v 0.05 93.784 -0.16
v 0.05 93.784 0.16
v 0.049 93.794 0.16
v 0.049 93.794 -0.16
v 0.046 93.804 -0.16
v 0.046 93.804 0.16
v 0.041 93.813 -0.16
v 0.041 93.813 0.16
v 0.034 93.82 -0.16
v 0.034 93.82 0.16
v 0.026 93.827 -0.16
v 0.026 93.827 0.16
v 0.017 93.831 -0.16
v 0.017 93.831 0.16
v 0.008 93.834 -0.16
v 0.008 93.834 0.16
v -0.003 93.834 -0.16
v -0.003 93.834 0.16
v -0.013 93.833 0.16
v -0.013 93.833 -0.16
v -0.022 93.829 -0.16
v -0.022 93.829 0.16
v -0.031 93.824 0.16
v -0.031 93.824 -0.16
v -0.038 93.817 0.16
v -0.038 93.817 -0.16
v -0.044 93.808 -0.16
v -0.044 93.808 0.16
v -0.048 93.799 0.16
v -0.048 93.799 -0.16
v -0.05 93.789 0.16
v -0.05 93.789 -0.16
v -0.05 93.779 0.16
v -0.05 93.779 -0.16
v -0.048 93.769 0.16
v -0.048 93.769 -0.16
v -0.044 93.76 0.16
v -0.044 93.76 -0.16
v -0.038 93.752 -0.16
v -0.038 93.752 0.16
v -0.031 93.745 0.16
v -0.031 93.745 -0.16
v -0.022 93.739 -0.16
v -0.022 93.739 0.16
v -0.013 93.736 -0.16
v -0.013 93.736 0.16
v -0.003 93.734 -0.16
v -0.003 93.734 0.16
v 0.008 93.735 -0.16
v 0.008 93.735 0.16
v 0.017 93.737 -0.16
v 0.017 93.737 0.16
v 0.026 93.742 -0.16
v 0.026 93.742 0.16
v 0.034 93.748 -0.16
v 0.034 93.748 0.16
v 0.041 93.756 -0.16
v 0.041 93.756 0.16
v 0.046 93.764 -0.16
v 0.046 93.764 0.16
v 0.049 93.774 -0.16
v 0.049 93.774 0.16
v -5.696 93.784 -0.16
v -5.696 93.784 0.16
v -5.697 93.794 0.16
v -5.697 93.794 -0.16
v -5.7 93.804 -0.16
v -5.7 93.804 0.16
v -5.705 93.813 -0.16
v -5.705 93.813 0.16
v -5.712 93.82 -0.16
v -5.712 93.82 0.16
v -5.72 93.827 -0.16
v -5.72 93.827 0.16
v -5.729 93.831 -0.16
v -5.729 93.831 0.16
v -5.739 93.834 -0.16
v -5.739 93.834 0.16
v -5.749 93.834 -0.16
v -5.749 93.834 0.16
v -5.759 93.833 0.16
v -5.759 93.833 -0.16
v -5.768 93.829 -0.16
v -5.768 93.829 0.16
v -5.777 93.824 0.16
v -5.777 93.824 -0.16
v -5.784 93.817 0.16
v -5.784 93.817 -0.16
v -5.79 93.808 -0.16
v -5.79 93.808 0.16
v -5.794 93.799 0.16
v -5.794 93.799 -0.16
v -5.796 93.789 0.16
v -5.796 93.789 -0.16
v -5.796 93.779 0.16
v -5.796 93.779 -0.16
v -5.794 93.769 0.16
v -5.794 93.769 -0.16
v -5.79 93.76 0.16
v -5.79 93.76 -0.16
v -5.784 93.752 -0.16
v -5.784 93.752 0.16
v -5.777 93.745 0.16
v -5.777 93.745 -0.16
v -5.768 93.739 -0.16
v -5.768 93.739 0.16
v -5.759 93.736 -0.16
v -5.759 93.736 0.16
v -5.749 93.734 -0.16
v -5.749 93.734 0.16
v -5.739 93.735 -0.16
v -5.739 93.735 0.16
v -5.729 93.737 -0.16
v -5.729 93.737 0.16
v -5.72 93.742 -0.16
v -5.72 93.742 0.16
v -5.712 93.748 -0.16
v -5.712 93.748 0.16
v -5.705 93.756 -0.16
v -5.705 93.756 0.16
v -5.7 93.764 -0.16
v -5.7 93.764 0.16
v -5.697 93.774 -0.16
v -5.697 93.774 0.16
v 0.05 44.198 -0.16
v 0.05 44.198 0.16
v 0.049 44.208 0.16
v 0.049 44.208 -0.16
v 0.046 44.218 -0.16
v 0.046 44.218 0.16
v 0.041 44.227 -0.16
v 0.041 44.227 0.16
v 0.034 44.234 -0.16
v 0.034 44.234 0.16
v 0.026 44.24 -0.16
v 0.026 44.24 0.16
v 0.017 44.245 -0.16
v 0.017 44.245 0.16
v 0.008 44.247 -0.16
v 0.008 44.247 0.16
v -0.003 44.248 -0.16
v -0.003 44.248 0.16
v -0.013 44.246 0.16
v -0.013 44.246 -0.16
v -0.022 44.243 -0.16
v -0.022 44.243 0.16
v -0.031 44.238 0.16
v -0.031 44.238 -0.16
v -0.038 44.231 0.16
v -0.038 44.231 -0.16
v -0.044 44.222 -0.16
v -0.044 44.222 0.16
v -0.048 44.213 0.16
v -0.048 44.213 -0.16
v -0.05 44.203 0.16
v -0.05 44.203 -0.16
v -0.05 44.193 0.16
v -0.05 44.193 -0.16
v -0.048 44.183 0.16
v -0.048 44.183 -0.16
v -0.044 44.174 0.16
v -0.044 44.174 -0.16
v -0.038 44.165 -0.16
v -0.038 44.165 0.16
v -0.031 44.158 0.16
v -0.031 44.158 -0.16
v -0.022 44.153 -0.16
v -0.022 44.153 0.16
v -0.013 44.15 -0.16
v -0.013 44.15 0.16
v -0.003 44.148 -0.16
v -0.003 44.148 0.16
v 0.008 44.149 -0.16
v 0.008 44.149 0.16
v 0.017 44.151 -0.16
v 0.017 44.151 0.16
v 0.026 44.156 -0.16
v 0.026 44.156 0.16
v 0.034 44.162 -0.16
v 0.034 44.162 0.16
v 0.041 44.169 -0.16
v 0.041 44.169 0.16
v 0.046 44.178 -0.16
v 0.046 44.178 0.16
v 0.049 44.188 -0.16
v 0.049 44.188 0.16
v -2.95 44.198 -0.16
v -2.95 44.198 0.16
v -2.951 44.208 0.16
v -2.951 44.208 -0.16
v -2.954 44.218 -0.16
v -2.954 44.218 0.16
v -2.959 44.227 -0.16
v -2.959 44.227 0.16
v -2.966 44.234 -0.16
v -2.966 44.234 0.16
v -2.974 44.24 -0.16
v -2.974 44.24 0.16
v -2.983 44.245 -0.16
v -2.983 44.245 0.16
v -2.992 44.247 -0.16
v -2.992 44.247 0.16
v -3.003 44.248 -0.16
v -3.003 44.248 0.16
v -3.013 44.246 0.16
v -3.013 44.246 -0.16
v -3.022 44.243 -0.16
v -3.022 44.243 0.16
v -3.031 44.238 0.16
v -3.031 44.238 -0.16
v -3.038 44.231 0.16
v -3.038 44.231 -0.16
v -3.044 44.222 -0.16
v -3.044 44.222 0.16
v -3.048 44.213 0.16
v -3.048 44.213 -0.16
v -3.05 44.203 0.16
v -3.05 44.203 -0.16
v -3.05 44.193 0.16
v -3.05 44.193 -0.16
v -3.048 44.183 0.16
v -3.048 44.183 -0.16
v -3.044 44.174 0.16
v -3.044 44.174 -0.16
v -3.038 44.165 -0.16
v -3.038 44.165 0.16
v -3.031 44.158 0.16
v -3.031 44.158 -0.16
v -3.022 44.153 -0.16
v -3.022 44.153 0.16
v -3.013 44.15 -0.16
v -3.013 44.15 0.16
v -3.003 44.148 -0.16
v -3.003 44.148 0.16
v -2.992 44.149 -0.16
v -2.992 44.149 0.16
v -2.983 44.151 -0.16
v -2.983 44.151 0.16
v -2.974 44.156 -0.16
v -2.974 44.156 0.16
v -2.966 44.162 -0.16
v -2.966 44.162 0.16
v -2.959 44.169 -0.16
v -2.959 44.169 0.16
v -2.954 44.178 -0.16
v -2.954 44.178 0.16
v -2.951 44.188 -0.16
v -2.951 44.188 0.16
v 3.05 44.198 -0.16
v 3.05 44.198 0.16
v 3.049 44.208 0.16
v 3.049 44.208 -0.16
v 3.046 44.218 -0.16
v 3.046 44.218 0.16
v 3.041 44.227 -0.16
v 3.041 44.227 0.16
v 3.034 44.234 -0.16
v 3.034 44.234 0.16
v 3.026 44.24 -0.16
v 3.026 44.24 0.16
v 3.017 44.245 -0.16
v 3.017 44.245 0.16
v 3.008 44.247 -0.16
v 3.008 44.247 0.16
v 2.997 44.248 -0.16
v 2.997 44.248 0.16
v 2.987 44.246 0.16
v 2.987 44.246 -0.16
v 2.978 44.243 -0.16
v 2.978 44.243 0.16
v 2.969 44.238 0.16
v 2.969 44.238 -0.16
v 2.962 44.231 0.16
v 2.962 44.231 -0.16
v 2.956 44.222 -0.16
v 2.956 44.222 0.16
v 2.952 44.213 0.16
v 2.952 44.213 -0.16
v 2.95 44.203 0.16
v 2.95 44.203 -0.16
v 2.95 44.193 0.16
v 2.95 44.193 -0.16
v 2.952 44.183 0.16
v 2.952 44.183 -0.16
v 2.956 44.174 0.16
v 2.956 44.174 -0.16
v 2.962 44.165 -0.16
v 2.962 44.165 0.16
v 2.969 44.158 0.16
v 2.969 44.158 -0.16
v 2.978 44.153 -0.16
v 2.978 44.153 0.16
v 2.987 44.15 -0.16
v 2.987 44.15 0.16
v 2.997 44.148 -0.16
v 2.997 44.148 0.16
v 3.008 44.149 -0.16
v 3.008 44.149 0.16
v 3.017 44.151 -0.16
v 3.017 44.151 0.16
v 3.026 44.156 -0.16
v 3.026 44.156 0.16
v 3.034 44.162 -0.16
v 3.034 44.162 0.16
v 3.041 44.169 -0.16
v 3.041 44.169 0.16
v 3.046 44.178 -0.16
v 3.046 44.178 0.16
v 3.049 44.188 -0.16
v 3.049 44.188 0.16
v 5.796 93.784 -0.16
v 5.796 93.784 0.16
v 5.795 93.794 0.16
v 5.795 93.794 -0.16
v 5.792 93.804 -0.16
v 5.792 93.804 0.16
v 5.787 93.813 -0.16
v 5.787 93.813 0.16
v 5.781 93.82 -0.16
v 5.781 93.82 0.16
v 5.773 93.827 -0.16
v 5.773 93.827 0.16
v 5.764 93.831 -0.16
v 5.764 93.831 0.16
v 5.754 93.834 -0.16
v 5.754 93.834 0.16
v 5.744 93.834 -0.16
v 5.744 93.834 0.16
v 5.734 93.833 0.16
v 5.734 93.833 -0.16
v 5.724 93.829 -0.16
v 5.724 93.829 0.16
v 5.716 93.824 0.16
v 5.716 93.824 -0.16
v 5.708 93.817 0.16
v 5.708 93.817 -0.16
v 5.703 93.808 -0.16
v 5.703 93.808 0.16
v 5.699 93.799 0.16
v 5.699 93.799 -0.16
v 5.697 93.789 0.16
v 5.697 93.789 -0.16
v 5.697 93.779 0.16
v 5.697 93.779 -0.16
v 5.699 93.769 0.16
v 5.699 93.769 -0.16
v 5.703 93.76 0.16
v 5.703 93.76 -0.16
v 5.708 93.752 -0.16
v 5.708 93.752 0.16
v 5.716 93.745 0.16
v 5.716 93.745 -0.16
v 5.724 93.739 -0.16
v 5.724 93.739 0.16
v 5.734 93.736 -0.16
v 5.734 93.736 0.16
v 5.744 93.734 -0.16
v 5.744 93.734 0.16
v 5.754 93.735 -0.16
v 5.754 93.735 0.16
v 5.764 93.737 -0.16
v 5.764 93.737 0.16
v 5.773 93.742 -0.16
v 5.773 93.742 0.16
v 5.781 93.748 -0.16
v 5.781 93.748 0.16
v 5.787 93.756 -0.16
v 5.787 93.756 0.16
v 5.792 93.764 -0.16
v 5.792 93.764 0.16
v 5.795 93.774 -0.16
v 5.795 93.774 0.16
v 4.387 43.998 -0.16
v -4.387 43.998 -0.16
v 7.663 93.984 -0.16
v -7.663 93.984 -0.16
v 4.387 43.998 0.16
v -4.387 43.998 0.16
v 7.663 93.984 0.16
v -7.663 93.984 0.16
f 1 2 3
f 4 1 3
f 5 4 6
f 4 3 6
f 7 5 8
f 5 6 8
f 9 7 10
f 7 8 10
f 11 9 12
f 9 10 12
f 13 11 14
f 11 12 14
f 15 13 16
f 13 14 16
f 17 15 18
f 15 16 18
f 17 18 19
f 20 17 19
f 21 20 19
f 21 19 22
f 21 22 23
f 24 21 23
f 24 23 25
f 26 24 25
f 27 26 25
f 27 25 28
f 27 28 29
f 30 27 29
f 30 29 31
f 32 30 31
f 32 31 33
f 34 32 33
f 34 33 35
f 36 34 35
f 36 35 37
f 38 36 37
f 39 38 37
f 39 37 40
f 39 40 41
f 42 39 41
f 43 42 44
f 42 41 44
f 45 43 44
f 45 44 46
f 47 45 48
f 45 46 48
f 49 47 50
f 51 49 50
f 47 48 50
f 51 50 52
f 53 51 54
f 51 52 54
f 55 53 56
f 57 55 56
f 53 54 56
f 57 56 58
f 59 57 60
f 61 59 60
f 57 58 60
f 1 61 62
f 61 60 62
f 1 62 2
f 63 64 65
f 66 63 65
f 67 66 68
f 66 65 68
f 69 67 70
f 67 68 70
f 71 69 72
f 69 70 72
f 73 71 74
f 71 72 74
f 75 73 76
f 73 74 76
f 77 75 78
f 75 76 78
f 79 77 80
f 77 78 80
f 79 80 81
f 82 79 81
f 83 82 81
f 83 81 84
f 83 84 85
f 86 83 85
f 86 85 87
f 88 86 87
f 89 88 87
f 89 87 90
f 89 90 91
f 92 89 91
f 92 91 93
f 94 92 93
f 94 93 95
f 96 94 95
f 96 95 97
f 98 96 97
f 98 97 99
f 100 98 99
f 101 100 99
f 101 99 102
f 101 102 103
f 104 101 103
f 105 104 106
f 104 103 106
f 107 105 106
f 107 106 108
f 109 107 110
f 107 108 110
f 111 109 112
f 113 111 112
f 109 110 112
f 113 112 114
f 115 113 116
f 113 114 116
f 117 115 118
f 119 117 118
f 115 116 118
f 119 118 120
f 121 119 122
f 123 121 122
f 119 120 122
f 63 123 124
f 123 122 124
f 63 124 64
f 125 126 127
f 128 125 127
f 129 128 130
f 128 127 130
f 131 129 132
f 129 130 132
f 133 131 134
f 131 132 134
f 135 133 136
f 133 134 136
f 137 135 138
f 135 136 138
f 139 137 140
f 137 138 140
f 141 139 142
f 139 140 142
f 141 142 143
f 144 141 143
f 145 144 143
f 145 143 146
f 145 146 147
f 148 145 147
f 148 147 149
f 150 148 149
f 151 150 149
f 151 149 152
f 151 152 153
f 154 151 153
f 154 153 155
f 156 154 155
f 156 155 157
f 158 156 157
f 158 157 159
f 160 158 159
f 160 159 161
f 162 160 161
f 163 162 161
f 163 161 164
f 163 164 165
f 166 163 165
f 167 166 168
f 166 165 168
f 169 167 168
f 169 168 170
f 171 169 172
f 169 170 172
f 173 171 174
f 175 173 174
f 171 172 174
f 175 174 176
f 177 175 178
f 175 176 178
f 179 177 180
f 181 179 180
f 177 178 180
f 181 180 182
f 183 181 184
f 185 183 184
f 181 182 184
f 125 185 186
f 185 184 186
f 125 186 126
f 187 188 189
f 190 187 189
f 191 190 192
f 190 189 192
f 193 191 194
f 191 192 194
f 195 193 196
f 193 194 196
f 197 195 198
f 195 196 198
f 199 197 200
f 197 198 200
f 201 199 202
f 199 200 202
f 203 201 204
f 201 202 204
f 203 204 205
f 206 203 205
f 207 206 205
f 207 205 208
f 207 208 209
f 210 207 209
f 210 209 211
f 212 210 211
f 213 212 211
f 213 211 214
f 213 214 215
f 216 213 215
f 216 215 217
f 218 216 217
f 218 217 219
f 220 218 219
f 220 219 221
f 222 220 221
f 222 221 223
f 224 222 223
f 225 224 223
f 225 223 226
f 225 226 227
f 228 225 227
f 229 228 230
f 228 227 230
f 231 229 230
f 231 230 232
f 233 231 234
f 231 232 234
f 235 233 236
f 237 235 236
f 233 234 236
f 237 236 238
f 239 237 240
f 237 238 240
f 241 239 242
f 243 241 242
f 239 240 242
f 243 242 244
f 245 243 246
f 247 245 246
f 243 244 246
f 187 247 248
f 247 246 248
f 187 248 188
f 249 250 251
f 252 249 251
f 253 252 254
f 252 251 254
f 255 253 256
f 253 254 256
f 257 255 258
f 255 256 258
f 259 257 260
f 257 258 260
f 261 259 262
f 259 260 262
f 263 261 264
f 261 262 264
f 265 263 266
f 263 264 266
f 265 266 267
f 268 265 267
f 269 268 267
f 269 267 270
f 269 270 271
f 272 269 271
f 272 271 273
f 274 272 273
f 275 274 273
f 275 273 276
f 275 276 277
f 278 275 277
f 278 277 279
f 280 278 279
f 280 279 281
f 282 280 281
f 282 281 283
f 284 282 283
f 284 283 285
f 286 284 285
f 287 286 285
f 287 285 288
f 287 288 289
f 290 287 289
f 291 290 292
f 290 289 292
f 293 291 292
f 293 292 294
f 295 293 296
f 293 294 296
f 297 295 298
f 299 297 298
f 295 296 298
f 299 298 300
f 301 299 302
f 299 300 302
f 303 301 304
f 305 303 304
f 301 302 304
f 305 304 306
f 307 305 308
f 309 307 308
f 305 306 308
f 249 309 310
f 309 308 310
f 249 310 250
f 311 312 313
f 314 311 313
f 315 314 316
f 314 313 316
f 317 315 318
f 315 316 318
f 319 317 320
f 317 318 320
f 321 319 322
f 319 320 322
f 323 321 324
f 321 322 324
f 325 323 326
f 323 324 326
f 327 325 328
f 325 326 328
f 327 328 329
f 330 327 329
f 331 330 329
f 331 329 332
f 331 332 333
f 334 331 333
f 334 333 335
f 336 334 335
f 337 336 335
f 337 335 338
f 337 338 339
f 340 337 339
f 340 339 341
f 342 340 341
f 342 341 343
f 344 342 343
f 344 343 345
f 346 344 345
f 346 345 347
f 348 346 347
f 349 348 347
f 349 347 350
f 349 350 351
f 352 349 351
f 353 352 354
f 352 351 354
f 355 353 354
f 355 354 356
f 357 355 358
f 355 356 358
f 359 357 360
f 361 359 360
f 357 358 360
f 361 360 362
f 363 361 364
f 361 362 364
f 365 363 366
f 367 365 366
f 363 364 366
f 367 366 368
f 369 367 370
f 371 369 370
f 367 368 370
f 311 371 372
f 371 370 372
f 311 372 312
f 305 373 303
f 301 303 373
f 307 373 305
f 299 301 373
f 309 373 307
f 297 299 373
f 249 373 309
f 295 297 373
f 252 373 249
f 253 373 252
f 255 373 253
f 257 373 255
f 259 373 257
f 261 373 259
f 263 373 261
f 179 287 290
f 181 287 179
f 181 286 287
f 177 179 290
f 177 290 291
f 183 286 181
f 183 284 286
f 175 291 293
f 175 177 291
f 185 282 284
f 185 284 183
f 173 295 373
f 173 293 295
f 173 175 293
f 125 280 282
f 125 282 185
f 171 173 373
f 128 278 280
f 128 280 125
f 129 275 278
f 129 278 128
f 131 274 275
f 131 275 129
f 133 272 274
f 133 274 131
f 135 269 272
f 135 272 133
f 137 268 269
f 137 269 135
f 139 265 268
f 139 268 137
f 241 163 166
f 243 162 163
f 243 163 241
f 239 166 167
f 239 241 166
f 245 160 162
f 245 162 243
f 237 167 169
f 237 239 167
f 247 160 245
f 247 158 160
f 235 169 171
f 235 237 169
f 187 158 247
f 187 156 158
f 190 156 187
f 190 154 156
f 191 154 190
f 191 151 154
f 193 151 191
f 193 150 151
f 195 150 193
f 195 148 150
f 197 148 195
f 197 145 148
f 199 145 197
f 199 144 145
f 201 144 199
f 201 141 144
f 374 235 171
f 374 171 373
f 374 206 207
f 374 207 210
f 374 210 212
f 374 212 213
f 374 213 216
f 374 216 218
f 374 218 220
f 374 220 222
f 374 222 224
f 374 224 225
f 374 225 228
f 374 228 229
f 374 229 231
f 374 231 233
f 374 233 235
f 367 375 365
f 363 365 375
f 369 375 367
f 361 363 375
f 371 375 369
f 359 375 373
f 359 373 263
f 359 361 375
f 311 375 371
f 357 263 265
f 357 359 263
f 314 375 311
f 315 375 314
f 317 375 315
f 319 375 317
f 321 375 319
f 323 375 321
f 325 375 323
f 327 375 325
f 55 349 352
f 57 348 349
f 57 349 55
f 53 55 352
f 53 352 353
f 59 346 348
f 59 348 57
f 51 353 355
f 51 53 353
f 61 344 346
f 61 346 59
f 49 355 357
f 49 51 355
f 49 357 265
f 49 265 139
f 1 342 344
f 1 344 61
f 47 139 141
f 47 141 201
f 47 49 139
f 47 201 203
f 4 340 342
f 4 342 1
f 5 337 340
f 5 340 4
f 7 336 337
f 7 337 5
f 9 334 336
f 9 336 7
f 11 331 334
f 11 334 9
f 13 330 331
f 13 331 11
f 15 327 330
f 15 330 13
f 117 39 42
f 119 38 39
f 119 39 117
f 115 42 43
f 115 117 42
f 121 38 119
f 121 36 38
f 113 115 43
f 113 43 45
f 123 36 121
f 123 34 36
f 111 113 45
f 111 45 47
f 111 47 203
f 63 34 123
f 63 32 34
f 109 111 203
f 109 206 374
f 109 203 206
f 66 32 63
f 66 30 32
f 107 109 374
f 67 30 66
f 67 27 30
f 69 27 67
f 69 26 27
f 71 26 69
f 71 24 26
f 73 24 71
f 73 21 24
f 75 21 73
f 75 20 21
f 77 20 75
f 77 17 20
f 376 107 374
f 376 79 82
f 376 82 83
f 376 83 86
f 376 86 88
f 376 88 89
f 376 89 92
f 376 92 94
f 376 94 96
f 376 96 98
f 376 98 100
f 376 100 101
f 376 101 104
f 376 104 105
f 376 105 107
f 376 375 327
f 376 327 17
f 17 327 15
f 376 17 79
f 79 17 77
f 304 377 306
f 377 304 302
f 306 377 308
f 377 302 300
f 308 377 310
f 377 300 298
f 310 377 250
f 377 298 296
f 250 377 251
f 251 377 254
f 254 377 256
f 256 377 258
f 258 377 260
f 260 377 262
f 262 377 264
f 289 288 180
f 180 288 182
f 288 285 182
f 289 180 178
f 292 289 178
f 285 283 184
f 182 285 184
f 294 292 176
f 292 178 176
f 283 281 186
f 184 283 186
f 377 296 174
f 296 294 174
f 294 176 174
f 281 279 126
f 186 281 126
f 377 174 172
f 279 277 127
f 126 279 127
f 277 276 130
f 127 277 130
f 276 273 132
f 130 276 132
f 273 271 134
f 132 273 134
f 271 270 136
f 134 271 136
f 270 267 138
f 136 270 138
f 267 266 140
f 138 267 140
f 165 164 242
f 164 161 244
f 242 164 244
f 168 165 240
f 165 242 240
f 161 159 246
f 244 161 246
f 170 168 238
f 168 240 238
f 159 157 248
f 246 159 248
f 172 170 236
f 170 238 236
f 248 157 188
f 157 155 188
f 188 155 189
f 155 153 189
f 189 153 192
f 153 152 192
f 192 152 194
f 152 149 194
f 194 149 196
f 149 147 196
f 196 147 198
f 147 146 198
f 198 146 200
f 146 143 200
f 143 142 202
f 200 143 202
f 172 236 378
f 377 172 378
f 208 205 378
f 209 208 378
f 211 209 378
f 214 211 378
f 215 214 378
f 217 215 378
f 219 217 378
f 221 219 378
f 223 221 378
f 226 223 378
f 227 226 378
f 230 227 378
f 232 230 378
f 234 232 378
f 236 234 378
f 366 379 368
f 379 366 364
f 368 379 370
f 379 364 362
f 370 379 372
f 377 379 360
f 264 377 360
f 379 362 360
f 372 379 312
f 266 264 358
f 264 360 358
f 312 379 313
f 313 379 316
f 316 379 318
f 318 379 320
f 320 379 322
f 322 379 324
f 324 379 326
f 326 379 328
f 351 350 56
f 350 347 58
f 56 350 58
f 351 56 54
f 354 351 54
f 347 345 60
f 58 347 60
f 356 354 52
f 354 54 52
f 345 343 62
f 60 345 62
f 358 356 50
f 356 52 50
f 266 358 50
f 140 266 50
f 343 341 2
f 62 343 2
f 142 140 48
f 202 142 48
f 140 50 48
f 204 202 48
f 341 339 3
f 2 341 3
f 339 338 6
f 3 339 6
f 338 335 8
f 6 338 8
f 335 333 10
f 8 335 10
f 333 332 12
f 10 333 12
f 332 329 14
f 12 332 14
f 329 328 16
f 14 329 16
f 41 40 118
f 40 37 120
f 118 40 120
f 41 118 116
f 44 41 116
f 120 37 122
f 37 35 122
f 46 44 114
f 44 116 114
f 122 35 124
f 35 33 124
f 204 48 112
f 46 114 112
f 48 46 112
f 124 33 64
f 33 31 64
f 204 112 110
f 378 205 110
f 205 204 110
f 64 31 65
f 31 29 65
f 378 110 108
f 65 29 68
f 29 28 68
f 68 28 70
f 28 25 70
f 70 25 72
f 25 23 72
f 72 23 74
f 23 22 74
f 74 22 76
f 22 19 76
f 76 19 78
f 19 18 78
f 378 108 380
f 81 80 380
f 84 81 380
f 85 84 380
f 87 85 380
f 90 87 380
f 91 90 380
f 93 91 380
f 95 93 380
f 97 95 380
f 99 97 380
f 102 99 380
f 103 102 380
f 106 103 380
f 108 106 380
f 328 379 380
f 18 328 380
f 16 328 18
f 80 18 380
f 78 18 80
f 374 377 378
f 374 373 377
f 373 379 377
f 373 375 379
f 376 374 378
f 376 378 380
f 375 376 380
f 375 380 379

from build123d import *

# Parameters (mm, degrees)
EXTRUDE1_DEPTH = 0.16
SKETCH4_R      = 0.05
EXTRUDE3_DEPTH = 1.32


with BuildPart() as part:
    # Sketch1 → Extrude1 (new body, symmetric)
    with BuildSketch(Plane(origin=(0, 0, 0), x_dir=(-1, 0, 0), z_dir=(0, 0, -1))):
        Polygon((-4.387, 43.998003308), (4.387, 43.998003308), (7.663262056, 93.984102838), (-7.663262056, 93.984102838), align=None)
    extrude(amount=EXTRUDE1_DEPTH, both=True)

    # Sketch4 → Extrude3 (cut, through all)
    with BuildSketch(Plane.XY.offset(0.16)):
        with Locations((-3, 44.198003308)):
            Circle(SKETCH4_R)
        with Locations((0, 44.198003308)):
            Circle(SKETCH4_R)
        with Locations((3, 44.198003308)):
            Circle(SKETCH4_R)
        with Locations((-5.746391555, 93.784102838)):
            Circle(SKETCH4_R)
        with Locations((0, 93.784102838)):
            Circle(SKETCH4_R)
        with Locations((5.746391555, 93.784102838)):
            Circle(SKETCH4_R)
    extrude(amount=-EXTRUDE3_DEPTH, mode=Mode.SUBTRACT)


solid = part.part
